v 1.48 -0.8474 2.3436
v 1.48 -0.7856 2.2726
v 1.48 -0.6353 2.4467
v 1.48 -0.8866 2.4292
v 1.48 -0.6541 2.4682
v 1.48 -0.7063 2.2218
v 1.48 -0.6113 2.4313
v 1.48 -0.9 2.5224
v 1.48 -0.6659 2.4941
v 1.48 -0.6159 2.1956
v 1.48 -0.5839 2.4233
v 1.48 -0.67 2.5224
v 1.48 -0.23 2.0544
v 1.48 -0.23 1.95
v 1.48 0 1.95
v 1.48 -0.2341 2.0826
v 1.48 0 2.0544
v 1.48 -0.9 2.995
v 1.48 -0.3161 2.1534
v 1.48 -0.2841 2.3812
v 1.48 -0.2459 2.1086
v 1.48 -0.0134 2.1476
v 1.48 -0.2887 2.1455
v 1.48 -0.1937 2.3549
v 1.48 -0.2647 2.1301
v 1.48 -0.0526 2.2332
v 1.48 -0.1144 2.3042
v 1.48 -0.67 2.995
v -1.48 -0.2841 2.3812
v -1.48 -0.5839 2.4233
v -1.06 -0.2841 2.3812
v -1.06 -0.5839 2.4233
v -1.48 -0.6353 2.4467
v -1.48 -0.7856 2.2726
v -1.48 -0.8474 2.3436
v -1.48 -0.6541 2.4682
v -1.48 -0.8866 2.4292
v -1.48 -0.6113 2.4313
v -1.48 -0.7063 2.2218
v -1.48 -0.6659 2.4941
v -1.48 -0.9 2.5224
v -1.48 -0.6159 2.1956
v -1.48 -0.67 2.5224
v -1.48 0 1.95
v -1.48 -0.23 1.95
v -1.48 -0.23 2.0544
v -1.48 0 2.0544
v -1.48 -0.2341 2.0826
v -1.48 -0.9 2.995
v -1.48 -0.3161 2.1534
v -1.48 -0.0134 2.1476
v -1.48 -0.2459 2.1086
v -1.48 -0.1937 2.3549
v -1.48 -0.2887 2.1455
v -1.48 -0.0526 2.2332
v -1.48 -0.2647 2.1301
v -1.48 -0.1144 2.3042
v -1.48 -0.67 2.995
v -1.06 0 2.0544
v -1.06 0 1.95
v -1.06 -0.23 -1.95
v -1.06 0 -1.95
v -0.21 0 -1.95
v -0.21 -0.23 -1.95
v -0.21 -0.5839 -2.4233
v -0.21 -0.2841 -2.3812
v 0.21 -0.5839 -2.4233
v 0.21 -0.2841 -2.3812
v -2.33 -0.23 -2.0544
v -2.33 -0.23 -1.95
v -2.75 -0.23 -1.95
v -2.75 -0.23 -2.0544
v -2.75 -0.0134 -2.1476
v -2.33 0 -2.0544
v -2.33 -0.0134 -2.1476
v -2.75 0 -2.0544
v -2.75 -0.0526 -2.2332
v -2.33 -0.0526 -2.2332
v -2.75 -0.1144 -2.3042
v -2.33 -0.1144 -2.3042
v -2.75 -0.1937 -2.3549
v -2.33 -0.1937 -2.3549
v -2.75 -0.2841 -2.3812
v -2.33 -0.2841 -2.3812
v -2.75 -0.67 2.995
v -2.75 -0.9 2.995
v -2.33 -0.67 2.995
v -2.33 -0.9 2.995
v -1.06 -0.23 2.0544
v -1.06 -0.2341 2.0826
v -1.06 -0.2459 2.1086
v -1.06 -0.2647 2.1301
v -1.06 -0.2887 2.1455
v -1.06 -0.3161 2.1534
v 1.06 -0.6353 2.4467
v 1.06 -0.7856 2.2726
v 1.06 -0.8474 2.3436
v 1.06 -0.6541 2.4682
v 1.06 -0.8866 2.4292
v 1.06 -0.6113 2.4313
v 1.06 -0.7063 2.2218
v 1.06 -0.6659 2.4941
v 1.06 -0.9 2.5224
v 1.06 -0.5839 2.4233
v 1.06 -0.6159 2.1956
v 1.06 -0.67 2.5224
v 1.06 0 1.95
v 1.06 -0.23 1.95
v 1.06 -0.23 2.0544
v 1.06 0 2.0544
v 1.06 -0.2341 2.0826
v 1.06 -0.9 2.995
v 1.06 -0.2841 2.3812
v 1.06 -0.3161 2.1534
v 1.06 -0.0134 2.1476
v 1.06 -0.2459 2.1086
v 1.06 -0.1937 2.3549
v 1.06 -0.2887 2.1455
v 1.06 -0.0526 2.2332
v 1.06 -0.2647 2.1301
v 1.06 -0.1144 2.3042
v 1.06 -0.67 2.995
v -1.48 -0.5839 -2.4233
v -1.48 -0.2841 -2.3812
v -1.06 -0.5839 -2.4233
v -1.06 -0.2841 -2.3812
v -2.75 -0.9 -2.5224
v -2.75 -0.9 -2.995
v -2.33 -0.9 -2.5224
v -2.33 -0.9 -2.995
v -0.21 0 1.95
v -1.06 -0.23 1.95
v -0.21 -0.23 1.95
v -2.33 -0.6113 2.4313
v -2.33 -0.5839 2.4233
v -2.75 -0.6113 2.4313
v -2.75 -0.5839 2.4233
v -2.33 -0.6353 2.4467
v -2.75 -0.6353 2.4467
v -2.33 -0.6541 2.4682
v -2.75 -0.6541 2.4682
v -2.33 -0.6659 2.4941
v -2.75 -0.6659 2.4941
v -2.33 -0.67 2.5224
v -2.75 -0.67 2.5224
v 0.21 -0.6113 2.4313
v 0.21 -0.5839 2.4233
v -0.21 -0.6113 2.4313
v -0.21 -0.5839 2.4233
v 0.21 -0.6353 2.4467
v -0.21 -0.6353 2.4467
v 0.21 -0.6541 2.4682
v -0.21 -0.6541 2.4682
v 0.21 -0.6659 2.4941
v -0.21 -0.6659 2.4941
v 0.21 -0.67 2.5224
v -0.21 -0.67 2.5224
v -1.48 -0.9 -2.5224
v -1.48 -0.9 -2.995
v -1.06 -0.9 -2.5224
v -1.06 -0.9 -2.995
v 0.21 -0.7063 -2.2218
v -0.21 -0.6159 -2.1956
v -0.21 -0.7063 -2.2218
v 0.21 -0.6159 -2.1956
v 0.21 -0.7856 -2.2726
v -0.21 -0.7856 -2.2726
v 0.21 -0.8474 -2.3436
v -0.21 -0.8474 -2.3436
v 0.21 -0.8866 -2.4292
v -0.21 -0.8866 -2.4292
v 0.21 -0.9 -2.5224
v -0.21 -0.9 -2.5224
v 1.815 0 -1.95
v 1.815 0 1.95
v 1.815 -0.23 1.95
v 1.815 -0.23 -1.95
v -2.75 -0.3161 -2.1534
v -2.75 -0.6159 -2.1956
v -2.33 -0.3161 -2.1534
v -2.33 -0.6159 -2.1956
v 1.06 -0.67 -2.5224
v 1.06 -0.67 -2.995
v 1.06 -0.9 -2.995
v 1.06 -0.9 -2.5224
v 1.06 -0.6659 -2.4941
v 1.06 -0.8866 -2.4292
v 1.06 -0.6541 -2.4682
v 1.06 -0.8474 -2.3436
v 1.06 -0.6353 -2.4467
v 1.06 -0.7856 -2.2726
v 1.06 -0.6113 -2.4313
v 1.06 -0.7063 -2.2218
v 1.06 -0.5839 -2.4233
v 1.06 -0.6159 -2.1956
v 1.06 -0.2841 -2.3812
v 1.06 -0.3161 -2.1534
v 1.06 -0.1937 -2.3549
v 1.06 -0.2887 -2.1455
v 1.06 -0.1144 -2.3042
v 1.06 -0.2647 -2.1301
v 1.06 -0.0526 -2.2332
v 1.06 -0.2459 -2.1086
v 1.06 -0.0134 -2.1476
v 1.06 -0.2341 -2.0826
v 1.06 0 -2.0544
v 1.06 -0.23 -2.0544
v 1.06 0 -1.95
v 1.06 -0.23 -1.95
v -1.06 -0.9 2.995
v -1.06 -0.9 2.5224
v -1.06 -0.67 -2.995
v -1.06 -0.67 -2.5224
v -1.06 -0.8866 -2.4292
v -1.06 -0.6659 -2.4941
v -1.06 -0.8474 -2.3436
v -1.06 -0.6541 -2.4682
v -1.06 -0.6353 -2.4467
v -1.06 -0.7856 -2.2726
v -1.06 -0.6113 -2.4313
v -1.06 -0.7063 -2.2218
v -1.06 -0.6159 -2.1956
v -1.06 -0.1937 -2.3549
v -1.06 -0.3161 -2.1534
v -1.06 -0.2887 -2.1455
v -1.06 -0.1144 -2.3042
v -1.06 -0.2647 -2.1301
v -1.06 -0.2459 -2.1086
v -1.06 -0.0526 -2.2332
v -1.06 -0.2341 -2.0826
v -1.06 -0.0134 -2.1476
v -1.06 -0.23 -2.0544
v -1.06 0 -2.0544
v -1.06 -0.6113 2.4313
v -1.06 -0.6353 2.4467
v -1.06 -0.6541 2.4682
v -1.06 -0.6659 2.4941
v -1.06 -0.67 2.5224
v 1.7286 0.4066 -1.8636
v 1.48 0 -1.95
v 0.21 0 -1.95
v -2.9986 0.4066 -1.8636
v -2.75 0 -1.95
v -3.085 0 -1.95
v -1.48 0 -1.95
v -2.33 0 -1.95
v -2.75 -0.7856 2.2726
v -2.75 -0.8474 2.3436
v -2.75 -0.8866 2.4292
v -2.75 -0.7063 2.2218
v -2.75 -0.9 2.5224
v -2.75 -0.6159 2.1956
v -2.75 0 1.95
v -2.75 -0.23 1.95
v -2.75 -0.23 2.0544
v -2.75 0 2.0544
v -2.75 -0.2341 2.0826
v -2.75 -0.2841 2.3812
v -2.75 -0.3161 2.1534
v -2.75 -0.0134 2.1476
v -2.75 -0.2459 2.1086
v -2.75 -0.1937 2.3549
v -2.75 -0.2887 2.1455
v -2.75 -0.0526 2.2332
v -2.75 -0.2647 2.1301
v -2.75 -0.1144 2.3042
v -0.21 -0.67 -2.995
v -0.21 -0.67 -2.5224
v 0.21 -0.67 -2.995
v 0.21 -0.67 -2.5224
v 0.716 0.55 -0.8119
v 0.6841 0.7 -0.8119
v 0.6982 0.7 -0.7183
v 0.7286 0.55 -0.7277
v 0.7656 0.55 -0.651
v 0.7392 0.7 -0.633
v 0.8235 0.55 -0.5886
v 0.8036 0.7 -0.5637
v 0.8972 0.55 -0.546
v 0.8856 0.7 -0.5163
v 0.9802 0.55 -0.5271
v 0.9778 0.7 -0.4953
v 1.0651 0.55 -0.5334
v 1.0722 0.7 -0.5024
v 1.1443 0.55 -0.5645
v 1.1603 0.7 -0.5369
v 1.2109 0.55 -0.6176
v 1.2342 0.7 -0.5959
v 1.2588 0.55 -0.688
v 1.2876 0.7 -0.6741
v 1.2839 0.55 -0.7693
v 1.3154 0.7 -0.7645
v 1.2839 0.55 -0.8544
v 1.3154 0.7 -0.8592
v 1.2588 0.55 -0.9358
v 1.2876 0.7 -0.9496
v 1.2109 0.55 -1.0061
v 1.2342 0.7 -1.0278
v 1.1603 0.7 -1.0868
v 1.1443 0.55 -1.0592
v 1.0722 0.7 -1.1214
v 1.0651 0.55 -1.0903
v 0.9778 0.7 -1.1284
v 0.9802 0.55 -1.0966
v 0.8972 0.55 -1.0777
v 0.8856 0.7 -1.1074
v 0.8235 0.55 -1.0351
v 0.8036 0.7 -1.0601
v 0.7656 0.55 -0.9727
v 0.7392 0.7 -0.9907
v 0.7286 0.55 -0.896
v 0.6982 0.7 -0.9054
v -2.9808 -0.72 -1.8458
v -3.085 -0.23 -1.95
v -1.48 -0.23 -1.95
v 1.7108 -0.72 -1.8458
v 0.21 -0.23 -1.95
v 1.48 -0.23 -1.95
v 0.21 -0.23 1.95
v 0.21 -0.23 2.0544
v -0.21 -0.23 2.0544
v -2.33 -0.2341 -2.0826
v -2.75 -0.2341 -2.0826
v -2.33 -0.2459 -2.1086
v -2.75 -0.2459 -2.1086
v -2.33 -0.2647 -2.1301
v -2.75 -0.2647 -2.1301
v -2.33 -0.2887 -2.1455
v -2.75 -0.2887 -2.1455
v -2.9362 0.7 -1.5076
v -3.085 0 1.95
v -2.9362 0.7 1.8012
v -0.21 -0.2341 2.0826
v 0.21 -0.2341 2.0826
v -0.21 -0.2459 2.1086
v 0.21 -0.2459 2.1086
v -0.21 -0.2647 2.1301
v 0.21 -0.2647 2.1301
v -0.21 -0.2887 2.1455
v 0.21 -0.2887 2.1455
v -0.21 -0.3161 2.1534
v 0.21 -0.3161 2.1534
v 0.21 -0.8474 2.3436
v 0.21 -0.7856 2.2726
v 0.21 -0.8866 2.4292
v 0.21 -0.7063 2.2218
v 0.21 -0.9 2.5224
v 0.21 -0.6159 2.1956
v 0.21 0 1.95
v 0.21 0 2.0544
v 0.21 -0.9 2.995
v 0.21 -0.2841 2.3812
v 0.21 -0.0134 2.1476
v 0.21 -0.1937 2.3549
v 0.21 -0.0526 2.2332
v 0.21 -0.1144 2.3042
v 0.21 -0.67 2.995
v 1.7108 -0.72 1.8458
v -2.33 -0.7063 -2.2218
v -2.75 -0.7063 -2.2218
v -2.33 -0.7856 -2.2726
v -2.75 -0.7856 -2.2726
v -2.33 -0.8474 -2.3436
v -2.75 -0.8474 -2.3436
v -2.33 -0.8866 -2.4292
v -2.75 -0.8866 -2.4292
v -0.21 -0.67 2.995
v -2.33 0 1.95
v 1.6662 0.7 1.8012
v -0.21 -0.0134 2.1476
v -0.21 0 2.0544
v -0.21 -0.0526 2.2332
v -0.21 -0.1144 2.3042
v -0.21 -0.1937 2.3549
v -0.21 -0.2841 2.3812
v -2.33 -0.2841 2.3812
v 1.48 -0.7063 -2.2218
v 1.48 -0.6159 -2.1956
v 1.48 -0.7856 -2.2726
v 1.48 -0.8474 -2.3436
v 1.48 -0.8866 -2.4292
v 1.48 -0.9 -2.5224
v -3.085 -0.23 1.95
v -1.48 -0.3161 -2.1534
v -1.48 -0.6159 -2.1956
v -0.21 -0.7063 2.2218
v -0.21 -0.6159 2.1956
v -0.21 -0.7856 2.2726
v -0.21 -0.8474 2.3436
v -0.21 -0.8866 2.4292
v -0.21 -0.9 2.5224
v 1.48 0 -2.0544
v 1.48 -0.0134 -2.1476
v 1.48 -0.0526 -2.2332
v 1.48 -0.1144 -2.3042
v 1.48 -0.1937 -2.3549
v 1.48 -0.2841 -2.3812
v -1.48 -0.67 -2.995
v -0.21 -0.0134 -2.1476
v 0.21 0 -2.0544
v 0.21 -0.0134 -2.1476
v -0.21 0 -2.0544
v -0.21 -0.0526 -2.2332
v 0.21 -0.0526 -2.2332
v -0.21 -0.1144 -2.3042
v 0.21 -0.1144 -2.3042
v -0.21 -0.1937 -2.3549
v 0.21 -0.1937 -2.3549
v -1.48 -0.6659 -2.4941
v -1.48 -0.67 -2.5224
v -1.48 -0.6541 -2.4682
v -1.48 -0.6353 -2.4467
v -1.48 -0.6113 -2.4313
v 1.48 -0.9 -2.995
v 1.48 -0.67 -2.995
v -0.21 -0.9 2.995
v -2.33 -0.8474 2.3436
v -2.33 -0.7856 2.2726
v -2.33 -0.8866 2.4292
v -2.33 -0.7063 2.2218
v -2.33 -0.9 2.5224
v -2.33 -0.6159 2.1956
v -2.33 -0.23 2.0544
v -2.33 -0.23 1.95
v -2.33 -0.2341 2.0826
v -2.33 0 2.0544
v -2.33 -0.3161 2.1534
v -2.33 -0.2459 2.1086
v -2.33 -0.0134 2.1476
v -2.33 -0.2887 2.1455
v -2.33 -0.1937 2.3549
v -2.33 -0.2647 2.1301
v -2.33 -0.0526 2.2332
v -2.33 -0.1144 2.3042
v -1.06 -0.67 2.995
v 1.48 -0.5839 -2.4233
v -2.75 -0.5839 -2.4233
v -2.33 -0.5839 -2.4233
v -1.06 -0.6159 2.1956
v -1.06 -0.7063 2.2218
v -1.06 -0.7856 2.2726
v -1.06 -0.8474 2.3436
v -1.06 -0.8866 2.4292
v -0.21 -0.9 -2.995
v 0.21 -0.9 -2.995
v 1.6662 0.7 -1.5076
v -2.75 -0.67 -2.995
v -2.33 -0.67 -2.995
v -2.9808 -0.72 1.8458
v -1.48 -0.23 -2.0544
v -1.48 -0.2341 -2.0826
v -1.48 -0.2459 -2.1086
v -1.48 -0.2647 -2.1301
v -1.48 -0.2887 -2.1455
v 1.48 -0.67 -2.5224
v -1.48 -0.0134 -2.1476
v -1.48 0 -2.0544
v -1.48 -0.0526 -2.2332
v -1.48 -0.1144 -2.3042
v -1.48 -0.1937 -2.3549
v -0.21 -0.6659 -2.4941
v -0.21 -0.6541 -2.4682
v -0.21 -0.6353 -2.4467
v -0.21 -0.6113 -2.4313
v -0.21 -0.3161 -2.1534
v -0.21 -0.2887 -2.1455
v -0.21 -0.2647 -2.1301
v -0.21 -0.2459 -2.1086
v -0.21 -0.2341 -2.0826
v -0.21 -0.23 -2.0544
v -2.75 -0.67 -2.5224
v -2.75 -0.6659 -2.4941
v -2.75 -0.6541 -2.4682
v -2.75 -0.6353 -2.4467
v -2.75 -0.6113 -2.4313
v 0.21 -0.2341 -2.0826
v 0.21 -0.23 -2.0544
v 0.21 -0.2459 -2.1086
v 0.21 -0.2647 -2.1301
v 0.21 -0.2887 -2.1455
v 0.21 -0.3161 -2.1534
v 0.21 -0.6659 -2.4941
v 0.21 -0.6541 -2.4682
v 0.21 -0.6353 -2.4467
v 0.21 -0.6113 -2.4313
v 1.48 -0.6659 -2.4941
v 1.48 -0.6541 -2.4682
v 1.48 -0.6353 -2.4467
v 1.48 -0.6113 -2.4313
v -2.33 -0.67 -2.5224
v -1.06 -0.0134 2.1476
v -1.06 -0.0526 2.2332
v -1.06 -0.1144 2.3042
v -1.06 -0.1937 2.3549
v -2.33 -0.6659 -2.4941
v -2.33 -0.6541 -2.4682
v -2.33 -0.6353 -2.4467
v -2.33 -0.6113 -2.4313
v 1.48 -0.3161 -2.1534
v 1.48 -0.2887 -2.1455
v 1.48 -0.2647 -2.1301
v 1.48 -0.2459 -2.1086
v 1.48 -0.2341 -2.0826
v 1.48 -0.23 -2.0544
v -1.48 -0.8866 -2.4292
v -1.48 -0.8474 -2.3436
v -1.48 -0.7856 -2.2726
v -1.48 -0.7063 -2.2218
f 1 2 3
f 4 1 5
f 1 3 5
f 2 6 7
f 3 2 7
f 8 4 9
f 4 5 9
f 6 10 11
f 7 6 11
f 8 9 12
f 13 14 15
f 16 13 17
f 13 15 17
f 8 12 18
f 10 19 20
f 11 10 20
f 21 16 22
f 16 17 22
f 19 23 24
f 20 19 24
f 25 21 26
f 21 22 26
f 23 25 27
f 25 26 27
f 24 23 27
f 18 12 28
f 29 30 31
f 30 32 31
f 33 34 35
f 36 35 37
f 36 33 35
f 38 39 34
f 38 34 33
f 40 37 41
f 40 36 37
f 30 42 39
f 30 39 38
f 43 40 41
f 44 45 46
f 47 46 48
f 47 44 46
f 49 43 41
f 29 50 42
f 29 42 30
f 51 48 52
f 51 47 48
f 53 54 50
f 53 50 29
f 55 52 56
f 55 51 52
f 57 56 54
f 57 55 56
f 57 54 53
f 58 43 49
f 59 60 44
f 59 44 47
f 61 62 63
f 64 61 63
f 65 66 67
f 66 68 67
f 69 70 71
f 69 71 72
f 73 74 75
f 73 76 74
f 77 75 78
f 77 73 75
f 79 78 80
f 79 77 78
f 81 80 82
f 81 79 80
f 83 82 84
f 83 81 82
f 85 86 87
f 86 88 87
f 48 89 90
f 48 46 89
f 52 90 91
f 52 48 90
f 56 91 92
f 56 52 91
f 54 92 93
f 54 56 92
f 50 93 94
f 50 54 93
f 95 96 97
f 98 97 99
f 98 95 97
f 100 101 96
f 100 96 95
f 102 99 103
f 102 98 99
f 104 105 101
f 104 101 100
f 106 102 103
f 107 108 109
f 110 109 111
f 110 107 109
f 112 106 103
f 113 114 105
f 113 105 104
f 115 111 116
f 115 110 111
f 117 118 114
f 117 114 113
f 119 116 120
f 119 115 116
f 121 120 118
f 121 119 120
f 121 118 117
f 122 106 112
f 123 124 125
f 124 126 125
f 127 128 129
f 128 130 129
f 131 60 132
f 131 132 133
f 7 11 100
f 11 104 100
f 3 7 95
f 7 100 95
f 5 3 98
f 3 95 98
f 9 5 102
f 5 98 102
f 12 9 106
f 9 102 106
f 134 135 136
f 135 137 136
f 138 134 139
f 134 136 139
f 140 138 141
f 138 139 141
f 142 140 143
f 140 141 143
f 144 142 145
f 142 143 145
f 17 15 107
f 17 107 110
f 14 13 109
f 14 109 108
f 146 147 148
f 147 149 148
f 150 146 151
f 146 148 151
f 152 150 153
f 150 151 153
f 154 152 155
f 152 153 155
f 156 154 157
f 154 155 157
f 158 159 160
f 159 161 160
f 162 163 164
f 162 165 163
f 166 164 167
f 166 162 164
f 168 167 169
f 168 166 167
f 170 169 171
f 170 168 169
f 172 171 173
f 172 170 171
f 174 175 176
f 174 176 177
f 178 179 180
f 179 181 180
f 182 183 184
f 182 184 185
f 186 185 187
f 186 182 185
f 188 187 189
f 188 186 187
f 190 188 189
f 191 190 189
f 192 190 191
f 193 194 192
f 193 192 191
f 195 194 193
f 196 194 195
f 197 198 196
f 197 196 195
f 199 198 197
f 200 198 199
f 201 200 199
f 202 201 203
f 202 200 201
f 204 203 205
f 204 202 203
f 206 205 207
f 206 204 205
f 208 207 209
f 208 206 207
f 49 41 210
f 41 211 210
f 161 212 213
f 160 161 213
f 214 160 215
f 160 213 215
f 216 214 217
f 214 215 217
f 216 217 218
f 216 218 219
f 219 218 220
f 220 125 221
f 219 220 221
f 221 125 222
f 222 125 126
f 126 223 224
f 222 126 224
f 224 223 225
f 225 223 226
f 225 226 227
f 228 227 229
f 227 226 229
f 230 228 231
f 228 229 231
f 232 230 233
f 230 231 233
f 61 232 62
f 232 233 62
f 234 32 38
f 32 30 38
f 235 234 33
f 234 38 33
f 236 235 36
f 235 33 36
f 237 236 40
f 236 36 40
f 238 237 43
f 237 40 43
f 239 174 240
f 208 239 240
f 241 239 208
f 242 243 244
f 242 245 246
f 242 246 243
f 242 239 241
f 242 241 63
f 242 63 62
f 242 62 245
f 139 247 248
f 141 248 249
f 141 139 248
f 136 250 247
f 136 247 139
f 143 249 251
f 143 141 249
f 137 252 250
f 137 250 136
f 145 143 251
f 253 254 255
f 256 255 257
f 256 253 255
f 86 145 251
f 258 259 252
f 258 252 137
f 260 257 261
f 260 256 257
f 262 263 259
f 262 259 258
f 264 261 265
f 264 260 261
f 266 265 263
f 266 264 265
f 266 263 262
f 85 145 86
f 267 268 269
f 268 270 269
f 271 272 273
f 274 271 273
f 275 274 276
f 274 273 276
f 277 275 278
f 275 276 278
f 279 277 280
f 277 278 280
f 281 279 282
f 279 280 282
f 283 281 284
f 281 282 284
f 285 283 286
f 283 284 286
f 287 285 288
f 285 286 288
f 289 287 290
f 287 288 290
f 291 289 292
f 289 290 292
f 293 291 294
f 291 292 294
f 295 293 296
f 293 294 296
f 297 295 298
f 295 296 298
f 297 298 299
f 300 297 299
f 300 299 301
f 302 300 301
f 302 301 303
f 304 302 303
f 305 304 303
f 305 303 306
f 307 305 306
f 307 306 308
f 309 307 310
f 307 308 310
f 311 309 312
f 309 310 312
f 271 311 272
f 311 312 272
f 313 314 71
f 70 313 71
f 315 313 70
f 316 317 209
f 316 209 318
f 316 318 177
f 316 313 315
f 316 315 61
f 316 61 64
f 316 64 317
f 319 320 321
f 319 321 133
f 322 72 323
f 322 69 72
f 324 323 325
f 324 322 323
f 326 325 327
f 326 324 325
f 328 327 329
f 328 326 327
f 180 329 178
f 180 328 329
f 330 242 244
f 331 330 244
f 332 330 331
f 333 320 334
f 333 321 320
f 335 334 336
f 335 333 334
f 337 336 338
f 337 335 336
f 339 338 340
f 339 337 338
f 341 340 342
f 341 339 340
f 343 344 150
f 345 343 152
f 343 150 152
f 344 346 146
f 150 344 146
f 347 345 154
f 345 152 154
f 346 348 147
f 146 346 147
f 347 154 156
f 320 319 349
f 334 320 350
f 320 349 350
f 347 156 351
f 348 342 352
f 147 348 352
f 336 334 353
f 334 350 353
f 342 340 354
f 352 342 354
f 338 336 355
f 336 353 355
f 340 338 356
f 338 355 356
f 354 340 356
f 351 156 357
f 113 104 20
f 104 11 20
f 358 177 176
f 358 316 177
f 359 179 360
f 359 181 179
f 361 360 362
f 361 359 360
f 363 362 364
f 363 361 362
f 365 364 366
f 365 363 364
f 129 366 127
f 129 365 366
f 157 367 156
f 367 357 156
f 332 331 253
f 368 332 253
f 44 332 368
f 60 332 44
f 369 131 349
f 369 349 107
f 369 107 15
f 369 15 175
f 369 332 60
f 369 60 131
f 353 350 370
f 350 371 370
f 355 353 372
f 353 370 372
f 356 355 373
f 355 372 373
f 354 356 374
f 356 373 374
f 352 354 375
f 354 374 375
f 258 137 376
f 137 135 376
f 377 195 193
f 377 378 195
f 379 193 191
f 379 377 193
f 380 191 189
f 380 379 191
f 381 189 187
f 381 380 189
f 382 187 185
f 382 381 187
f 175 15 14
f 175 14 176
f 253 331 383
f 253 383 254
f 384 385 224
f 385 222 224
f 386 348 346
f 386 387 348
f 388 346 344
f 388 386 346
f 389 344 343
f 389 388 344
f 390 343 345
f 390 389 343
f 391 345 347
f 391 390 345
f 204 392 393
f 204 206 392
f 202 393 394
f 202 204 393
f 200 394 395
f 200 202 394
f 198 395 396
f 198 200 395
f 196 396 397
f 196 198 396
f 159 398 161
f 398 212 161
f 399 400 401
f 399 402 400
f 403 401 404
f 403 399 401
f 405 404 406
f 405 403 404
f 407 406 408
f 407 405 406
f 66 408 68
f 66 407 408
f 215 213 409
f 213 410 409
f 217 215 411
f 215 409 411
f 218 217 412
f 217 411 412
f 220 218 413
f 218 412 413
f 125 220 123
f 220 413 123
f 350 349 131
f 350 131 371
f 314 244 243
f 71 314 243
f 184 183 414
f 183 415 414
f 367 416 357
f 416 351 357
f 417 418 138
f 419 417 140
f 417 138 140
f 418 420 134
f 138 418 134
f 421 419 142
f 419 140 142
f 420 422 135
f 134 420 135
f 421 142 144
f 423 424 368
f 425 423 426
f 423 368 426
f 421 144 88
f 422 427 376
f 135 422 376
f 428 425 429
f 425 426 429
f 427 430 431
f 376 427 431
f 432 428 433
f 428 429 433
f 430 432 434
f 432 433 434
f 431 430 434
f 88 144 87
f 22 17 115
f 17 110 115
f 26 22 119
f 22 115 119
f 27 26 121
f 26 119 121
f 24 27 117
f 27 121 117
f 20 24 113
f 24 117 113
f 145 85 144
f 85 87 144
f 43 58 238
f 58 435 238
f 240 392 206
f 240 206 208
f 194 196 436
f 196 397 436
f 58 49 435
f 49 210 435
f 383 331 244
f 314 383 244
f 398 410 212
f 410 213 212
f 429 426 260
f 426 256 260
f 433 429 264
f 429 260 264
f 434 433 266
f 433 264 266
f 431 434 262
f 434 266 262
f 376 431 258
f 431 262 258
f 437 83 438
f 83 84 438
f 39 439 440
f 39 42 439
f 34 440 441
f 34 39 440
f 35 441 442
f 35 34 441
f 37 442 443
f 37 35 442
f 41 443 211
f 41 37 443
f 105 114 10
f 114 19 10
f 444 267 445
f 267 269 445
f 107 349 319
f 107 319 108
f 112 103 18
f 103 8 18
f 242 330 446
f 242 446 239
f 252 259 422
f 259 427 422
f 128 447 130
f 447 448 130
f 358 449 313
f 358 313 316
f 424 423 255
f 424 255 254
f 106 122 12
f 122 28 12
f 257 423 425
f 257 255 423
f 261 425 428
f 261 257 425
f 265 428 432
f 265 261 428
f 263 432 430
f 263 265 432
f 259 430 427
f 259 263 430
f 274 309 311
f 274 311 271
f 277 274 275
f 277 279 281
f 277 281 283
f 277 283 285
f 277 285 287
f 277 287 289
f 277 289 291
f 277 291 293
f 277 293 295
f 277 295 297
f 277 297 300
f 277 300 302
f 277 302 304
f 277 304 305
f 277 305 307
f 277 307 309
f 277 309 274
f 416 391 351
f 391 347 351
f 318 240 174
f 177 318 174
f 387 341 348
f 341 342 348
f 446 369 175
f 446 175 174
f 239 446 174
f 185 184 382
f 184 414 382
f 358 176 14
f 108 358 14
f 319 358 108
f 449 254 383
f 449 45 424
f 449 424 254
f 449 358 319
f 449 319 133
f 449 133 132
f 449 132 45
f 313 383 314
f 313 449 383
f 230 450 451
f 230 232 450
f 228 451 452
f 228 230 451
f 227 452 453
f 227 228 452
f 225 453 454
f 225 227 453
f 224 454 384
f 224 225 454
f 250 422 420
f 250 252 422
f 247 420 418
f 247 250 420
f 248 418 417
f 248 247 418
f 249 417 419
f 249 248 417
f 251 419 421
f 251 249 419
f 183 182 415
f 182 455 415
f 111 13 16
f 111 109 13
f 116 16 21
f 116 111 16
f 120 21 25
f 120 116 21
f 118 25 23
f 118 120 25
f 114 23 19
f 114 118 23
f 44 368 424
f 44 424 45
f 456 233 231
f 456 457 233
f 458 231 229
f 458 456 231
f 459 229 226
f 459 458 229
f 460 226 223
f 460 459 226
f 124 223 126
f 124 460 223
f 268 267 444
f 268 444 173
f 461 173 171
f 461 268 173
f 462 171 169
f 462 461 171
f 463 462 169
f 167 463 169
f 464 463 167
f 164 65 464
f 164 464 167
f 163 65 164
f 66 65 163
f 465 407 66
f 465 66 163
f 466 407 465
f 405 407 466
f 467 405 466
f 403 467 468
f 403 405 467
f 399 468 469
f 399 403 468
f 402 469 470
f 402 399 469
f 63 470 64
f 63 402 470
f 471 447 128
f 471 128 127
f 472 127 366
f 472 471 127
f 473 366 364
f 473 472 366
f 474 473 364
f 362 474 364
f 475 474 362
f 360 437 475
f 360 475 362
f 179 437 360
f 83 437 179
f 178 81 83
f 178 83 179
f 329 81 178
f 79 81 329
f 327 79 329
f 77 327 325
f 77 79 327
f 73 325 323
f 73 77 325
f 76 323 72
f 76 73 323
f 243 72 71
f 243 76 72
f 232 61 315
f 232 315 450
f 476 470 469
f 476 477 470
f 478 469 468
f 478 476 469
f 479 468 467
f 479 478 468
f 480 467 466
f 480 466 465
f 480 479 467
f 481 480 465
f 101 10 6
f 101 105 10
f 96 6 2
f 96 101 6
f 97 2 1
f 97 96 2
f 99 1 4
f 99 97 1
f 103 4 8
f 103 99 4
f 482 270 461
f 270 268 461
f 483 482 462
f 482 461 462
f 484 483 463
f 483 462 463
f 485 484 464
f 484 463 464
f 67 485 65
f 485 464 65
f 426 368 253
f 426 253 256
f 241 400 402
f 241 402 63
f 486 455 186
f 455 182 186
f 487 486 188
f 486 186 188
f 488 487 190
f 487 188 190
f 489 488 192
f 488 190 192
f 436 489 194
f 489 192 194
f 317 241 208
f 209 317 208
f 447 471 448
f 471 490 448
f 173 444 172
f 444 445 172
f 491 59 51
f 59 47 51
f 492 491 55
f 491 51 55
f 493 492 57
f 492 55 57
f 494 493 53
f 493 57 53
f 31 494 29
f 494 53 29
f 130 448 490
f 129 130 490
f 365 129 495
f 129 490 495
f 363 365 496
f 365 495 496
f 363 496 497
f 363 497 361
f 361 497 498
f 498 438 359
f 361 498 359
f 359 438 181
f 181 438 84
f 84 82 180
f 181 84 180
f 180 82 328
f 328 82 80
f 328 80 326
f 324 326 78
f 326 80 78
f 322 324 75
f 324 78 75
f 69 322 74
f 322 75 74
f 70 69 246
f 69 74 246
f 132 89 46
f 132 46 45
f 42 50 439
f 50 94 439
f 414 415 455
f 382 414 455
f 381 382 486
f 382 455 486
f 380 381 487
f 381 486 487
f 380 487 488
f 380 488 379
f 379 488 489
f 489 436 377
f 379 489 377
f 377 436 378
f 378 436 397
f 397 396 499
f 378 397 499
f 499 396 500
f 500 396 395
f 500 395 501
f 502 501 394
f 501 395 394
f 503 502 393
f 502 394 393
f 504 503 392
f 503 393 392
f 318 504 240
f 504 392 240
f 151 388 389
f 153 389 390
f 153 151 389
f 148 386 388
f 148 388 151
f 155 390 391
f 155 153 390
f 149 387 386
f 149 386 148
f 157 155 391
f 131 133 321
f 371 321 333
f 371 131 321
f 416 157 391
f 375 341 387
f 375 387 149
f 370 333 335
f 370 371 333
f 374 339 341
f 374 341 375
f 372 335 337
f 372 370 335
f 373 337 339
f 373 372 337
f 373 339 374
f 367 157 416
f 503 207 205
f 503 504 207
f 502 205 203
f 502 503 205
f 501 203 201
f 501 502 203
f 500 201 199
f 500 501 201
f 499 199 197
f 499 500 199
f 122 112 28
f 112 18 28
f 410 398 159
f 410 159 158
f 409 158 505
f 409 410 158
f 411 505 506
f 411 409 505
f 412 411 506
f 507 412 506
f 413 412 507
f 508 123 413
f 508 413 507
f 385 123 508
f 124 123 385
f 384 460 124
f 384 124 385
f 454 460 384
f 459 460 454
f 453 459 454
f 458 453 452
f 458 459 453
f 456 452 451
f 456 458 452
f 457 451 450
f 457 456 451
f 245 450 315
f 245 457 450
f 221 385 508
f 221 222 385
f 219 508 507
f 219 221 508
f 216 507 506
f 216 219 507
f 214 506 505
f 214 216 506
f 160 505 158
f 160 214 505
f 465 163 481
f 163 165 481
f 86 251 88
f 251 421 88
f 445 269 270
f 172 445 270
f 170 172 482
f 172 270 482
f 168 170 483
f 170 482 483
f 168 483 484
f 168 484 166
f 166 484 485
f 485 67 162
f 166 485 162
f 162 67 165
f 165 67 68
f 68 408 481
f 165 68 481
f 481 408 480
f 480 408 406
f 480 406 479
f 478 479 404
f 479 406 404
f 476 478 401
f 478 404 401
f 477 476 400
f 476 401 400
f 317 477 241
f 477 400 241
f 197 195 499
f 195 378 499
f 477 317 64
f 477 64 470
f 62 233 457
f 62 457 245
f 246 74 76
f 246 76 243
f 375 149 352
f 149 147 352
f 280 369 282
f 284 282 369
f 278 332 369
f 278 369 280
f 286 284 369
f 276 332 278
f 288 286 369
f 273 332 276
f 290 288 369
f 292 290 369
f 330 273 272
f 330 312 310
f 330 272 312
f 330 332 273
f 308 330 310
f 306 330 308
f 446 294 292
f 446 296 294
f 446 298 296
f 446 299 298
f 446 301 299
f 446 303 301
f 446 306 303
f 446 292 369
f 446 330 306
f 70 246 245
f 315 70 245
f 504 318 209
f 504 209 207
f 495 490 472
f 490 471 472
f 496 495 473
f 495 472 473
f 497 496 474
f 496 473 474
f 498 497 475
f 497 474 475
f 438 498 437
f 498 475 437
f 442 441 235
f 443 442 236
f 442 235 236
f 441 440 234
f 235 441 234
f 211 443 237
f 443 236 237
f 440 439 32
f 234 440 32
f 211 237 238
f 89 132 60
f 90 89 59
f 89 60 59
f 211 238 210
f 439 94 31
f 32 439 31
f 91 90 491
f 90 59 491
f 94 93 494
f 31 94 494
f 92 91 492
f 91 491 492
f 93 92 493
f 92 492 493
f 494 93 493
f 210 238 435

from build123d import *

# Parameters (mm, degrees)
SKETCH1_W                = 4.9
SKETCH1_H                = 3.9
EXTRUDE1_DEPTH           = 0.7
EXTRUDE1_TAPER           = 12
EXTRUDE1_OTHER_WAY_DEPTH = 0.23
SKETCH2_W                = 4.9
SKETCH2_H                = 3.9
EXTRUDE2_DEPTH           = 0.49
EXTRUDE2_TAPER           = 12
CHAMFER1_SIZE            = 0.29360287
CHAMFER1_SIZE_2          = 0.3
SKETCH3_R                = 0.317461986
CUT_EXTRUDE1_DEPTH       = 0.15
CUT_EXTRUDE1_DRAFT       = -12
EXTRUDE3_DEPTH           = 0.21
LPATTERN3_COUNT          = 2
LPATTERN3_PITCH          = 1.27
LPATTERN3_COL_COUNT      = 3
LPATTERN3_COL_PITCH      = 1.27
FILLET1_R                = 0.1
FILLET2_R                = 0.33


with BuildPart() as part:
    # Sketch1 → Extrude1 (new body)
    with BuildSketch(Plane(origin=(0, 0, 0), x_dir=(1, 0, 0), z_dir=(0, 1, 0))):
        with Locations((-0.635, 0)):
            Rectangle(SKETCH1_W, SKETCH1_H)
    extrude(amount=EXTRUDE1_DEPTH, taper=EXTRUDE1_TAPER)

    # Sketch1 → Extrude1 other way (add)
    with BuildSketch(Plane(origin=(0, 0, 0), x_dir=(1, 0, 0), z_dir=(0, 1, 0))):
        with Locations((-0.635, 0)):
            Rectangle(SKETCH1_W, SKETCH1_H)
    extrude(amount=-EXTRUDE1_OTHER_WAY_DEPTH)

    # Sketch2 → Extrude2 (add)
    with BuildSketch(Plane.XZ.offset(0.23)):
        with Locations((-0.635, 0)):
            Rectangle(SKETCH2_W, SKETCH2_H)
    extrude(amount=EXTRUDE2_DEPTH, taper=EXTRUDE2_TAPER)

    # Chamfer1
    # the kernel refuses this chamfer: 0.3, 0.29360287 mm, written as the material it takes off along each edge
    with BuildSketch(Plane(origin=(2.439914076, 0.7, -1.801210407), x_dir=(0, 0.025194664498195983, 0.9996825640576229), z_dir=(-1, 0, 0))) as chamfer1_piece_1:
        Polygon((CHAMFER1_SIZE * 0.999682563914, -CHAMFER1_SIZE * 0.0251946644946), (-CHAMFER1_SIZE_2 * 0.232489792804, -CHAMFER1_SIZE_2 * 0.972598836233), (0, 0), align=None)
    extrude(amount=6.149828151, mode=Mode.SUBTRACT)


with BuildPart() as cut_extrude1_tool:
    # Sketch3 → Cut-Extrude1 (with draft: the straight prism first)
    with BuildSketch(Plane(origin=(0, 0.7, 0), x_dir=(-1, 0, 0), z_dir=(0, 1, 0))):
        with Locations((-1.001533305, -0.811859934)):
            Circle(SKETCH3_R)
    extrude(amount=-CUT_EXTRUDE1_DEPTH)
    # Cut-Extrude1: the draft: its side faces are tilted about the plane it starts from
    cut_extrude1_sides = [cut_extrude1_tool.faces().sort_by_distance(p)[0] for p in [
        (1.318995291, 0.625, -0.811859934),
    ]]
    draft(cut_extrude1_sides, Plane(origin=(0, 0.7, 0), x_dir=(-1, 0, 0), z_dir=(0, 1, 0)), CUT_EXTRUDE1_DRAFT)


with BuildPart() as part_1:
    add(part.part)

    # Cut-Extrude1: cut by cut_extrude1_tool
    add(cut_extrude1_tool.part, mode=Mode.SUBTRACT)

    # Sketch4 → Extrude3 (add, symmetric)
    with BuildSketch(Plane(origin=(0, 0, 0), x_dir=(0, 0, -1), z_dir=(1, 0, 0))):
        Polygon((1.95, -0.23), (-1.95, -0.23), (-2.141337425, -0.23), (-2.235499784, -0.9), (-2.995, -0.9), (-2.995, -0.67), (-2.435435734, -0.67), (-2.341273375, 0), (-1.95, 0), (1.95, 0), (2.341273375, 0), (2.435435734, -0.67), (2.995, -0.67), (2.995, -0.9), (2.235499784, -0.9), (2.141337425, -0.23), align=None)
    extrude3 = extrude(amount=EXTRUDE3_DEPTH, both=True)

    # LPattern3: Extrude3 ×2
    with Locations(*[(i * LPATTERN3_PITCH, 0, 0) for i in range(1, LPATTERN3_COUNT)]):
        add(extrude3)

    # LPattern3 col: Extrude3 ×3
    with Locations(*[(-i * LPATTERN3_COL_PITCH, 0, 0) for i in range(1, LPATTERN3_COL_COUNT)]):
        add(extrude3)

    # Fillet1
    fillet1_edges = [part_1.edges().sort_by_distance(p)[0] for p in [
        (-1.27, -0.23, 2.141337425),
        (-1.27, -0.23, -2.141337425),
        (-1.27, -0.67, -2.435435734),
        (-1.27, -0.67, 2.435435734),
        (-2.54, -0.23, 2.141337425),
        (-2.54, -0.23, -2.141337425),
        (-2.54, -0.67, -2.435435734),
        (-2.54, -0.67, 2.435435734),
        (1.27, -0.23, 2.141337425),
        (1.27, -0.23, -2.141337425),
        (1.27, -0.67, -2.435435734),
        (1.27, -0.67, 2.435435734),
        (0, -0.23, 2.141337425),
        (0, -0.23, -2.141337425),
        (0, -0.67, -2.435435734),
        (0, -0.67, 2.435435734),
    ]]
    fillet(fillet1_edges, radius=FILLET1_R)

    # Fillet2
    fillet2_edges = [part_1.edges().sort_by_distance(p)[0] for p in [
        (-1.27, 0, -2.341273375),
        (-1.27, -0.9, -2.235499784),
        (-1.27, 0, 2.341273375),
        (-1.27, -0.9, 2.235499784),
        (-2.54, 0, -2.341273375),
        (-2.54, -0.9, -2.235499784),
        (-2.54, 0, 2.341273375),
        (-2.54, -0.9, 2.235499784),
        (1.27, 0, -2.341273375),
        (1.27, -0.9, -2.235499784),
        (1.27, 0, 2.341273375),
        (1.27, -0.9, 2.235499784),
        (0, 0, -2.341273375),
        (0, -0.9, -2.235499784),
        (0, 0, 2.341273375),
        (0, -0.9, 2.235499784),
    ]]
    fillet(fillet2_edges, radius=FILLET2_R)


solid = part_1.part
